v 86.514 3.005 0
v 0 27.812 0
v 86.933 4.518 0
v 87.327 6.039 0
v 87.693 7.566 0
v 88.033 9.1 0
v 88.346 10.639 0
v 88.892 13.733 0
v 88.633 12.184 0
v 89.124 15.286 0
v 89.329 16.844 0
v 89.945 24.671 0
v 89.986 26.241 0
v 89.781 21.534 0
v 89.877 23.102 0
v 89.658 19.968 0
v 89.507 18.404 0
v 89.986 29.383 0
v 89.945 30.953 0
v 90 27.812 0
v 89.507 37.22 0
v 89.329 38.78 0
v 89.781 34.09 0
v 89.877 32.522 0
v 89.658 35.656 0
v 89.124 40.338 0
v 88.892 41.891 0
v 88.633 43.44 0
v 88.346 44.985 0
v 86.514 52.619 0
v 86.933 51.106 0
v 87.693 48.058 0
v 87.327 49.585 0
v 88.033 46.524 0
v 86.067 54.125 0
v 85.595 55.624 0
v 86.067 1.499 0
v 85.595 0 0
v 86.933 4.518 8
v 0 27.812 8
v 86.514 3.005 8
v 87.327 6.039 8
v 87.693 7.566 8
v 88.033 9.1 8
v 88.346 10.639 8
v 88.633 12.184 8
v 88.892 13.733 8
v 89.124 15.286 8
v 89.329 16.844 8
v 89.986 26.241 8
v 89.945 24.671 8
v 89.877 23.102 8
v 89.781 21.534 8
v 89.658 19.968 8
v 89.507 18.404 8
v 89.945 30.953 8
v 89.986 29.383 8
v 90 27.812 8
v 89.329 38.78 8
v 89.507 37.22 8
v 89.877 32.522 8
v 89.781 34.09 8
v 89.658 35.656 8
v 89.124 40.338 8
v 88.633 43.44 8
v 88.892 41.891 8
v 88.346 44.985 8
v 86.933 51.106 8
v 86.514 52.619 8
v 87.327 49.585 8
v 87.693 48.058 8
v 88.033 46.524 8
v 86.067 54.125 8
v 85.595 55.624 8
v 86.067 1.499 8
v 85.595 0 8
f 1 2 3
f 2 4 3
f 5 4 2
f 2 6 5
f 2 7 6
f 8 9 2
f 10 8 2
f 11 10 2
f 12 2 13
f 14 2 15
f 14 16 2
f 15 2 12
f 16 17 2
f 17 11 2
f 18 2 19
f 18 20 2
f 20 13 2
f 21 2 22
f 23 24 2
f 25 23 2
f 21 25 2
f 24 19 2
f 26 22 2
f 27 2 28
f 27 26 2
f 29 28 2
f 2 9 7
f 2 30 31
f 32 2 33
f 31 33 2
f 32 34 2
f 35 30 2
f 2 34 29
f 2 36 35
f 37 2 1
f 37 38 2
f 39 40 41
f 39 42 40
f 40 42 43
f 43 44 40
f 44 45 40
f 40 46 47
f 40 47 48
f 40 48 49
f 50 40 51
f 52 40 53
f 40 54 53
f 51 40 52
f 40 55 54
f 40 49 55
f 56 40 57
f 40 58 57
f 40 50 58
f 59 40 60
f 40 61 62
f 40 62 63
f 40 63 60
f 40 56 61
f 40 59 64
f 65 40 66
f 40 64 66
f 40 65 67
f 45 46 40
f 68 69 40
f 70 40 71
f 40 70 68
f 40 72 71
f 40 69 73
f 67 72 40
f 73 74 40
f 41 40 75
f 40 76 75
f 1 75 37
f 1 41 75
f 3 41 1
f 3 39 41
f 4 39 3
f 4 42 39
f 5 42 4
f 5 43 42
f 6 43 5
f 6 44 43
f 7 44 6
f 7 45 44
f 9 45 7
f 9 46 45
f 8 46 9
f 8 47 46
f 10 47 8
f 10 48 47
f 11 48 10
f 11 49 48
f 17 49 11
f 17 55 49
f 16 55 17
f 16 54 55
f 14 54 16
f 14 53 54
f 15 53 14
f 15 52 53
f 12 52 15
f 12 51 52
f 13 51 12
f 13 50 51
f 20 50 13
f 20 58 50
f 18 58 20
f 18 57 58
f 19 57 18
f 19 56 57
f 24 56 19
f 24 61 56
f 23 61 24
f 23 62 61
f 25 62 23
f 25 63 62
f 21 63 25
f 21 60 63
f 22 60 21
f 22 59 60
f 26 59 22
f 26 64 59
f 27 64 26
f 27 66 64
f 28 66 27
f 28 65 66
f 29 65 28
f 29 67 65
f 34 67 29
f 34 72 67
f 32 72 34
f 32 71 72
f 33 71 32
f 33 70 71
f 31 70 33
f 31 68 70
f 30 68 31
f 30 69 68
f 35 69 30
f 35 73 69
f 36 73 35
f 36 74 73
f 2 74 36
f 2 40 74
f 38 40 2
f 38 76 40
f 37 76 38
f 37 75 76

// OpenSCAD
$fn = 32;

// ----------------------------------------------------------------------
// Arc profile plate: sector, 38 points
// ----------------------------------------------------------------------

// --- parameters (mm) ---
sector_angle = 36;        // sector angle, degrees
sector_r = 90;            // outer radius
arc_step = 1;             // sampling step of the arc, degrees
plate_t = 8;              // plate thickness, Z

bbox_x = 2 * sector_r * sin(sector_angle / 2);  // chord of the sector
bbox_y = sector_r;  // depth of the sector (apex to arc)

profile = [[85.595, 0], [86.067, 1.499], [86.514, 3.005], [86.933, 4.518], [87.327, 6.039], [87.693, 7.566], [88.033, 9.1], [88.346, 10.639], [88.633, 12.184], [88.892, 13.733], [89.124, 15.286], [89.329, 16.844], [89.507, 18.404], [89.658, 19.968], [89.781, 21.534], [89.877, 23.102], [89.945, 24.671], [89.986, 26.241], [90, 27.812], [89.986, 29.383], [89.945, 30.953], [89.877, 32.522], [89.781, 34.09], [89.658, 35.656], [89.507, 37.22], [89.329, 38.78], [89.124, 40.338], [88.892, 41.891], [88.633, 43.44], [88.346, 44.985], [88.033, 46.524], [87.693, 48.058], [87.327, 49.585], [86.933, 51.106], [86.514, 52.619], [86.067, 54.125], [85.595, 55.624], [0, 27.812]];  // primary outline, 38 points, counter clockwise

// --- the one profile operation ---
linear_extrude(height = plate_t) polygon(points = profile);
